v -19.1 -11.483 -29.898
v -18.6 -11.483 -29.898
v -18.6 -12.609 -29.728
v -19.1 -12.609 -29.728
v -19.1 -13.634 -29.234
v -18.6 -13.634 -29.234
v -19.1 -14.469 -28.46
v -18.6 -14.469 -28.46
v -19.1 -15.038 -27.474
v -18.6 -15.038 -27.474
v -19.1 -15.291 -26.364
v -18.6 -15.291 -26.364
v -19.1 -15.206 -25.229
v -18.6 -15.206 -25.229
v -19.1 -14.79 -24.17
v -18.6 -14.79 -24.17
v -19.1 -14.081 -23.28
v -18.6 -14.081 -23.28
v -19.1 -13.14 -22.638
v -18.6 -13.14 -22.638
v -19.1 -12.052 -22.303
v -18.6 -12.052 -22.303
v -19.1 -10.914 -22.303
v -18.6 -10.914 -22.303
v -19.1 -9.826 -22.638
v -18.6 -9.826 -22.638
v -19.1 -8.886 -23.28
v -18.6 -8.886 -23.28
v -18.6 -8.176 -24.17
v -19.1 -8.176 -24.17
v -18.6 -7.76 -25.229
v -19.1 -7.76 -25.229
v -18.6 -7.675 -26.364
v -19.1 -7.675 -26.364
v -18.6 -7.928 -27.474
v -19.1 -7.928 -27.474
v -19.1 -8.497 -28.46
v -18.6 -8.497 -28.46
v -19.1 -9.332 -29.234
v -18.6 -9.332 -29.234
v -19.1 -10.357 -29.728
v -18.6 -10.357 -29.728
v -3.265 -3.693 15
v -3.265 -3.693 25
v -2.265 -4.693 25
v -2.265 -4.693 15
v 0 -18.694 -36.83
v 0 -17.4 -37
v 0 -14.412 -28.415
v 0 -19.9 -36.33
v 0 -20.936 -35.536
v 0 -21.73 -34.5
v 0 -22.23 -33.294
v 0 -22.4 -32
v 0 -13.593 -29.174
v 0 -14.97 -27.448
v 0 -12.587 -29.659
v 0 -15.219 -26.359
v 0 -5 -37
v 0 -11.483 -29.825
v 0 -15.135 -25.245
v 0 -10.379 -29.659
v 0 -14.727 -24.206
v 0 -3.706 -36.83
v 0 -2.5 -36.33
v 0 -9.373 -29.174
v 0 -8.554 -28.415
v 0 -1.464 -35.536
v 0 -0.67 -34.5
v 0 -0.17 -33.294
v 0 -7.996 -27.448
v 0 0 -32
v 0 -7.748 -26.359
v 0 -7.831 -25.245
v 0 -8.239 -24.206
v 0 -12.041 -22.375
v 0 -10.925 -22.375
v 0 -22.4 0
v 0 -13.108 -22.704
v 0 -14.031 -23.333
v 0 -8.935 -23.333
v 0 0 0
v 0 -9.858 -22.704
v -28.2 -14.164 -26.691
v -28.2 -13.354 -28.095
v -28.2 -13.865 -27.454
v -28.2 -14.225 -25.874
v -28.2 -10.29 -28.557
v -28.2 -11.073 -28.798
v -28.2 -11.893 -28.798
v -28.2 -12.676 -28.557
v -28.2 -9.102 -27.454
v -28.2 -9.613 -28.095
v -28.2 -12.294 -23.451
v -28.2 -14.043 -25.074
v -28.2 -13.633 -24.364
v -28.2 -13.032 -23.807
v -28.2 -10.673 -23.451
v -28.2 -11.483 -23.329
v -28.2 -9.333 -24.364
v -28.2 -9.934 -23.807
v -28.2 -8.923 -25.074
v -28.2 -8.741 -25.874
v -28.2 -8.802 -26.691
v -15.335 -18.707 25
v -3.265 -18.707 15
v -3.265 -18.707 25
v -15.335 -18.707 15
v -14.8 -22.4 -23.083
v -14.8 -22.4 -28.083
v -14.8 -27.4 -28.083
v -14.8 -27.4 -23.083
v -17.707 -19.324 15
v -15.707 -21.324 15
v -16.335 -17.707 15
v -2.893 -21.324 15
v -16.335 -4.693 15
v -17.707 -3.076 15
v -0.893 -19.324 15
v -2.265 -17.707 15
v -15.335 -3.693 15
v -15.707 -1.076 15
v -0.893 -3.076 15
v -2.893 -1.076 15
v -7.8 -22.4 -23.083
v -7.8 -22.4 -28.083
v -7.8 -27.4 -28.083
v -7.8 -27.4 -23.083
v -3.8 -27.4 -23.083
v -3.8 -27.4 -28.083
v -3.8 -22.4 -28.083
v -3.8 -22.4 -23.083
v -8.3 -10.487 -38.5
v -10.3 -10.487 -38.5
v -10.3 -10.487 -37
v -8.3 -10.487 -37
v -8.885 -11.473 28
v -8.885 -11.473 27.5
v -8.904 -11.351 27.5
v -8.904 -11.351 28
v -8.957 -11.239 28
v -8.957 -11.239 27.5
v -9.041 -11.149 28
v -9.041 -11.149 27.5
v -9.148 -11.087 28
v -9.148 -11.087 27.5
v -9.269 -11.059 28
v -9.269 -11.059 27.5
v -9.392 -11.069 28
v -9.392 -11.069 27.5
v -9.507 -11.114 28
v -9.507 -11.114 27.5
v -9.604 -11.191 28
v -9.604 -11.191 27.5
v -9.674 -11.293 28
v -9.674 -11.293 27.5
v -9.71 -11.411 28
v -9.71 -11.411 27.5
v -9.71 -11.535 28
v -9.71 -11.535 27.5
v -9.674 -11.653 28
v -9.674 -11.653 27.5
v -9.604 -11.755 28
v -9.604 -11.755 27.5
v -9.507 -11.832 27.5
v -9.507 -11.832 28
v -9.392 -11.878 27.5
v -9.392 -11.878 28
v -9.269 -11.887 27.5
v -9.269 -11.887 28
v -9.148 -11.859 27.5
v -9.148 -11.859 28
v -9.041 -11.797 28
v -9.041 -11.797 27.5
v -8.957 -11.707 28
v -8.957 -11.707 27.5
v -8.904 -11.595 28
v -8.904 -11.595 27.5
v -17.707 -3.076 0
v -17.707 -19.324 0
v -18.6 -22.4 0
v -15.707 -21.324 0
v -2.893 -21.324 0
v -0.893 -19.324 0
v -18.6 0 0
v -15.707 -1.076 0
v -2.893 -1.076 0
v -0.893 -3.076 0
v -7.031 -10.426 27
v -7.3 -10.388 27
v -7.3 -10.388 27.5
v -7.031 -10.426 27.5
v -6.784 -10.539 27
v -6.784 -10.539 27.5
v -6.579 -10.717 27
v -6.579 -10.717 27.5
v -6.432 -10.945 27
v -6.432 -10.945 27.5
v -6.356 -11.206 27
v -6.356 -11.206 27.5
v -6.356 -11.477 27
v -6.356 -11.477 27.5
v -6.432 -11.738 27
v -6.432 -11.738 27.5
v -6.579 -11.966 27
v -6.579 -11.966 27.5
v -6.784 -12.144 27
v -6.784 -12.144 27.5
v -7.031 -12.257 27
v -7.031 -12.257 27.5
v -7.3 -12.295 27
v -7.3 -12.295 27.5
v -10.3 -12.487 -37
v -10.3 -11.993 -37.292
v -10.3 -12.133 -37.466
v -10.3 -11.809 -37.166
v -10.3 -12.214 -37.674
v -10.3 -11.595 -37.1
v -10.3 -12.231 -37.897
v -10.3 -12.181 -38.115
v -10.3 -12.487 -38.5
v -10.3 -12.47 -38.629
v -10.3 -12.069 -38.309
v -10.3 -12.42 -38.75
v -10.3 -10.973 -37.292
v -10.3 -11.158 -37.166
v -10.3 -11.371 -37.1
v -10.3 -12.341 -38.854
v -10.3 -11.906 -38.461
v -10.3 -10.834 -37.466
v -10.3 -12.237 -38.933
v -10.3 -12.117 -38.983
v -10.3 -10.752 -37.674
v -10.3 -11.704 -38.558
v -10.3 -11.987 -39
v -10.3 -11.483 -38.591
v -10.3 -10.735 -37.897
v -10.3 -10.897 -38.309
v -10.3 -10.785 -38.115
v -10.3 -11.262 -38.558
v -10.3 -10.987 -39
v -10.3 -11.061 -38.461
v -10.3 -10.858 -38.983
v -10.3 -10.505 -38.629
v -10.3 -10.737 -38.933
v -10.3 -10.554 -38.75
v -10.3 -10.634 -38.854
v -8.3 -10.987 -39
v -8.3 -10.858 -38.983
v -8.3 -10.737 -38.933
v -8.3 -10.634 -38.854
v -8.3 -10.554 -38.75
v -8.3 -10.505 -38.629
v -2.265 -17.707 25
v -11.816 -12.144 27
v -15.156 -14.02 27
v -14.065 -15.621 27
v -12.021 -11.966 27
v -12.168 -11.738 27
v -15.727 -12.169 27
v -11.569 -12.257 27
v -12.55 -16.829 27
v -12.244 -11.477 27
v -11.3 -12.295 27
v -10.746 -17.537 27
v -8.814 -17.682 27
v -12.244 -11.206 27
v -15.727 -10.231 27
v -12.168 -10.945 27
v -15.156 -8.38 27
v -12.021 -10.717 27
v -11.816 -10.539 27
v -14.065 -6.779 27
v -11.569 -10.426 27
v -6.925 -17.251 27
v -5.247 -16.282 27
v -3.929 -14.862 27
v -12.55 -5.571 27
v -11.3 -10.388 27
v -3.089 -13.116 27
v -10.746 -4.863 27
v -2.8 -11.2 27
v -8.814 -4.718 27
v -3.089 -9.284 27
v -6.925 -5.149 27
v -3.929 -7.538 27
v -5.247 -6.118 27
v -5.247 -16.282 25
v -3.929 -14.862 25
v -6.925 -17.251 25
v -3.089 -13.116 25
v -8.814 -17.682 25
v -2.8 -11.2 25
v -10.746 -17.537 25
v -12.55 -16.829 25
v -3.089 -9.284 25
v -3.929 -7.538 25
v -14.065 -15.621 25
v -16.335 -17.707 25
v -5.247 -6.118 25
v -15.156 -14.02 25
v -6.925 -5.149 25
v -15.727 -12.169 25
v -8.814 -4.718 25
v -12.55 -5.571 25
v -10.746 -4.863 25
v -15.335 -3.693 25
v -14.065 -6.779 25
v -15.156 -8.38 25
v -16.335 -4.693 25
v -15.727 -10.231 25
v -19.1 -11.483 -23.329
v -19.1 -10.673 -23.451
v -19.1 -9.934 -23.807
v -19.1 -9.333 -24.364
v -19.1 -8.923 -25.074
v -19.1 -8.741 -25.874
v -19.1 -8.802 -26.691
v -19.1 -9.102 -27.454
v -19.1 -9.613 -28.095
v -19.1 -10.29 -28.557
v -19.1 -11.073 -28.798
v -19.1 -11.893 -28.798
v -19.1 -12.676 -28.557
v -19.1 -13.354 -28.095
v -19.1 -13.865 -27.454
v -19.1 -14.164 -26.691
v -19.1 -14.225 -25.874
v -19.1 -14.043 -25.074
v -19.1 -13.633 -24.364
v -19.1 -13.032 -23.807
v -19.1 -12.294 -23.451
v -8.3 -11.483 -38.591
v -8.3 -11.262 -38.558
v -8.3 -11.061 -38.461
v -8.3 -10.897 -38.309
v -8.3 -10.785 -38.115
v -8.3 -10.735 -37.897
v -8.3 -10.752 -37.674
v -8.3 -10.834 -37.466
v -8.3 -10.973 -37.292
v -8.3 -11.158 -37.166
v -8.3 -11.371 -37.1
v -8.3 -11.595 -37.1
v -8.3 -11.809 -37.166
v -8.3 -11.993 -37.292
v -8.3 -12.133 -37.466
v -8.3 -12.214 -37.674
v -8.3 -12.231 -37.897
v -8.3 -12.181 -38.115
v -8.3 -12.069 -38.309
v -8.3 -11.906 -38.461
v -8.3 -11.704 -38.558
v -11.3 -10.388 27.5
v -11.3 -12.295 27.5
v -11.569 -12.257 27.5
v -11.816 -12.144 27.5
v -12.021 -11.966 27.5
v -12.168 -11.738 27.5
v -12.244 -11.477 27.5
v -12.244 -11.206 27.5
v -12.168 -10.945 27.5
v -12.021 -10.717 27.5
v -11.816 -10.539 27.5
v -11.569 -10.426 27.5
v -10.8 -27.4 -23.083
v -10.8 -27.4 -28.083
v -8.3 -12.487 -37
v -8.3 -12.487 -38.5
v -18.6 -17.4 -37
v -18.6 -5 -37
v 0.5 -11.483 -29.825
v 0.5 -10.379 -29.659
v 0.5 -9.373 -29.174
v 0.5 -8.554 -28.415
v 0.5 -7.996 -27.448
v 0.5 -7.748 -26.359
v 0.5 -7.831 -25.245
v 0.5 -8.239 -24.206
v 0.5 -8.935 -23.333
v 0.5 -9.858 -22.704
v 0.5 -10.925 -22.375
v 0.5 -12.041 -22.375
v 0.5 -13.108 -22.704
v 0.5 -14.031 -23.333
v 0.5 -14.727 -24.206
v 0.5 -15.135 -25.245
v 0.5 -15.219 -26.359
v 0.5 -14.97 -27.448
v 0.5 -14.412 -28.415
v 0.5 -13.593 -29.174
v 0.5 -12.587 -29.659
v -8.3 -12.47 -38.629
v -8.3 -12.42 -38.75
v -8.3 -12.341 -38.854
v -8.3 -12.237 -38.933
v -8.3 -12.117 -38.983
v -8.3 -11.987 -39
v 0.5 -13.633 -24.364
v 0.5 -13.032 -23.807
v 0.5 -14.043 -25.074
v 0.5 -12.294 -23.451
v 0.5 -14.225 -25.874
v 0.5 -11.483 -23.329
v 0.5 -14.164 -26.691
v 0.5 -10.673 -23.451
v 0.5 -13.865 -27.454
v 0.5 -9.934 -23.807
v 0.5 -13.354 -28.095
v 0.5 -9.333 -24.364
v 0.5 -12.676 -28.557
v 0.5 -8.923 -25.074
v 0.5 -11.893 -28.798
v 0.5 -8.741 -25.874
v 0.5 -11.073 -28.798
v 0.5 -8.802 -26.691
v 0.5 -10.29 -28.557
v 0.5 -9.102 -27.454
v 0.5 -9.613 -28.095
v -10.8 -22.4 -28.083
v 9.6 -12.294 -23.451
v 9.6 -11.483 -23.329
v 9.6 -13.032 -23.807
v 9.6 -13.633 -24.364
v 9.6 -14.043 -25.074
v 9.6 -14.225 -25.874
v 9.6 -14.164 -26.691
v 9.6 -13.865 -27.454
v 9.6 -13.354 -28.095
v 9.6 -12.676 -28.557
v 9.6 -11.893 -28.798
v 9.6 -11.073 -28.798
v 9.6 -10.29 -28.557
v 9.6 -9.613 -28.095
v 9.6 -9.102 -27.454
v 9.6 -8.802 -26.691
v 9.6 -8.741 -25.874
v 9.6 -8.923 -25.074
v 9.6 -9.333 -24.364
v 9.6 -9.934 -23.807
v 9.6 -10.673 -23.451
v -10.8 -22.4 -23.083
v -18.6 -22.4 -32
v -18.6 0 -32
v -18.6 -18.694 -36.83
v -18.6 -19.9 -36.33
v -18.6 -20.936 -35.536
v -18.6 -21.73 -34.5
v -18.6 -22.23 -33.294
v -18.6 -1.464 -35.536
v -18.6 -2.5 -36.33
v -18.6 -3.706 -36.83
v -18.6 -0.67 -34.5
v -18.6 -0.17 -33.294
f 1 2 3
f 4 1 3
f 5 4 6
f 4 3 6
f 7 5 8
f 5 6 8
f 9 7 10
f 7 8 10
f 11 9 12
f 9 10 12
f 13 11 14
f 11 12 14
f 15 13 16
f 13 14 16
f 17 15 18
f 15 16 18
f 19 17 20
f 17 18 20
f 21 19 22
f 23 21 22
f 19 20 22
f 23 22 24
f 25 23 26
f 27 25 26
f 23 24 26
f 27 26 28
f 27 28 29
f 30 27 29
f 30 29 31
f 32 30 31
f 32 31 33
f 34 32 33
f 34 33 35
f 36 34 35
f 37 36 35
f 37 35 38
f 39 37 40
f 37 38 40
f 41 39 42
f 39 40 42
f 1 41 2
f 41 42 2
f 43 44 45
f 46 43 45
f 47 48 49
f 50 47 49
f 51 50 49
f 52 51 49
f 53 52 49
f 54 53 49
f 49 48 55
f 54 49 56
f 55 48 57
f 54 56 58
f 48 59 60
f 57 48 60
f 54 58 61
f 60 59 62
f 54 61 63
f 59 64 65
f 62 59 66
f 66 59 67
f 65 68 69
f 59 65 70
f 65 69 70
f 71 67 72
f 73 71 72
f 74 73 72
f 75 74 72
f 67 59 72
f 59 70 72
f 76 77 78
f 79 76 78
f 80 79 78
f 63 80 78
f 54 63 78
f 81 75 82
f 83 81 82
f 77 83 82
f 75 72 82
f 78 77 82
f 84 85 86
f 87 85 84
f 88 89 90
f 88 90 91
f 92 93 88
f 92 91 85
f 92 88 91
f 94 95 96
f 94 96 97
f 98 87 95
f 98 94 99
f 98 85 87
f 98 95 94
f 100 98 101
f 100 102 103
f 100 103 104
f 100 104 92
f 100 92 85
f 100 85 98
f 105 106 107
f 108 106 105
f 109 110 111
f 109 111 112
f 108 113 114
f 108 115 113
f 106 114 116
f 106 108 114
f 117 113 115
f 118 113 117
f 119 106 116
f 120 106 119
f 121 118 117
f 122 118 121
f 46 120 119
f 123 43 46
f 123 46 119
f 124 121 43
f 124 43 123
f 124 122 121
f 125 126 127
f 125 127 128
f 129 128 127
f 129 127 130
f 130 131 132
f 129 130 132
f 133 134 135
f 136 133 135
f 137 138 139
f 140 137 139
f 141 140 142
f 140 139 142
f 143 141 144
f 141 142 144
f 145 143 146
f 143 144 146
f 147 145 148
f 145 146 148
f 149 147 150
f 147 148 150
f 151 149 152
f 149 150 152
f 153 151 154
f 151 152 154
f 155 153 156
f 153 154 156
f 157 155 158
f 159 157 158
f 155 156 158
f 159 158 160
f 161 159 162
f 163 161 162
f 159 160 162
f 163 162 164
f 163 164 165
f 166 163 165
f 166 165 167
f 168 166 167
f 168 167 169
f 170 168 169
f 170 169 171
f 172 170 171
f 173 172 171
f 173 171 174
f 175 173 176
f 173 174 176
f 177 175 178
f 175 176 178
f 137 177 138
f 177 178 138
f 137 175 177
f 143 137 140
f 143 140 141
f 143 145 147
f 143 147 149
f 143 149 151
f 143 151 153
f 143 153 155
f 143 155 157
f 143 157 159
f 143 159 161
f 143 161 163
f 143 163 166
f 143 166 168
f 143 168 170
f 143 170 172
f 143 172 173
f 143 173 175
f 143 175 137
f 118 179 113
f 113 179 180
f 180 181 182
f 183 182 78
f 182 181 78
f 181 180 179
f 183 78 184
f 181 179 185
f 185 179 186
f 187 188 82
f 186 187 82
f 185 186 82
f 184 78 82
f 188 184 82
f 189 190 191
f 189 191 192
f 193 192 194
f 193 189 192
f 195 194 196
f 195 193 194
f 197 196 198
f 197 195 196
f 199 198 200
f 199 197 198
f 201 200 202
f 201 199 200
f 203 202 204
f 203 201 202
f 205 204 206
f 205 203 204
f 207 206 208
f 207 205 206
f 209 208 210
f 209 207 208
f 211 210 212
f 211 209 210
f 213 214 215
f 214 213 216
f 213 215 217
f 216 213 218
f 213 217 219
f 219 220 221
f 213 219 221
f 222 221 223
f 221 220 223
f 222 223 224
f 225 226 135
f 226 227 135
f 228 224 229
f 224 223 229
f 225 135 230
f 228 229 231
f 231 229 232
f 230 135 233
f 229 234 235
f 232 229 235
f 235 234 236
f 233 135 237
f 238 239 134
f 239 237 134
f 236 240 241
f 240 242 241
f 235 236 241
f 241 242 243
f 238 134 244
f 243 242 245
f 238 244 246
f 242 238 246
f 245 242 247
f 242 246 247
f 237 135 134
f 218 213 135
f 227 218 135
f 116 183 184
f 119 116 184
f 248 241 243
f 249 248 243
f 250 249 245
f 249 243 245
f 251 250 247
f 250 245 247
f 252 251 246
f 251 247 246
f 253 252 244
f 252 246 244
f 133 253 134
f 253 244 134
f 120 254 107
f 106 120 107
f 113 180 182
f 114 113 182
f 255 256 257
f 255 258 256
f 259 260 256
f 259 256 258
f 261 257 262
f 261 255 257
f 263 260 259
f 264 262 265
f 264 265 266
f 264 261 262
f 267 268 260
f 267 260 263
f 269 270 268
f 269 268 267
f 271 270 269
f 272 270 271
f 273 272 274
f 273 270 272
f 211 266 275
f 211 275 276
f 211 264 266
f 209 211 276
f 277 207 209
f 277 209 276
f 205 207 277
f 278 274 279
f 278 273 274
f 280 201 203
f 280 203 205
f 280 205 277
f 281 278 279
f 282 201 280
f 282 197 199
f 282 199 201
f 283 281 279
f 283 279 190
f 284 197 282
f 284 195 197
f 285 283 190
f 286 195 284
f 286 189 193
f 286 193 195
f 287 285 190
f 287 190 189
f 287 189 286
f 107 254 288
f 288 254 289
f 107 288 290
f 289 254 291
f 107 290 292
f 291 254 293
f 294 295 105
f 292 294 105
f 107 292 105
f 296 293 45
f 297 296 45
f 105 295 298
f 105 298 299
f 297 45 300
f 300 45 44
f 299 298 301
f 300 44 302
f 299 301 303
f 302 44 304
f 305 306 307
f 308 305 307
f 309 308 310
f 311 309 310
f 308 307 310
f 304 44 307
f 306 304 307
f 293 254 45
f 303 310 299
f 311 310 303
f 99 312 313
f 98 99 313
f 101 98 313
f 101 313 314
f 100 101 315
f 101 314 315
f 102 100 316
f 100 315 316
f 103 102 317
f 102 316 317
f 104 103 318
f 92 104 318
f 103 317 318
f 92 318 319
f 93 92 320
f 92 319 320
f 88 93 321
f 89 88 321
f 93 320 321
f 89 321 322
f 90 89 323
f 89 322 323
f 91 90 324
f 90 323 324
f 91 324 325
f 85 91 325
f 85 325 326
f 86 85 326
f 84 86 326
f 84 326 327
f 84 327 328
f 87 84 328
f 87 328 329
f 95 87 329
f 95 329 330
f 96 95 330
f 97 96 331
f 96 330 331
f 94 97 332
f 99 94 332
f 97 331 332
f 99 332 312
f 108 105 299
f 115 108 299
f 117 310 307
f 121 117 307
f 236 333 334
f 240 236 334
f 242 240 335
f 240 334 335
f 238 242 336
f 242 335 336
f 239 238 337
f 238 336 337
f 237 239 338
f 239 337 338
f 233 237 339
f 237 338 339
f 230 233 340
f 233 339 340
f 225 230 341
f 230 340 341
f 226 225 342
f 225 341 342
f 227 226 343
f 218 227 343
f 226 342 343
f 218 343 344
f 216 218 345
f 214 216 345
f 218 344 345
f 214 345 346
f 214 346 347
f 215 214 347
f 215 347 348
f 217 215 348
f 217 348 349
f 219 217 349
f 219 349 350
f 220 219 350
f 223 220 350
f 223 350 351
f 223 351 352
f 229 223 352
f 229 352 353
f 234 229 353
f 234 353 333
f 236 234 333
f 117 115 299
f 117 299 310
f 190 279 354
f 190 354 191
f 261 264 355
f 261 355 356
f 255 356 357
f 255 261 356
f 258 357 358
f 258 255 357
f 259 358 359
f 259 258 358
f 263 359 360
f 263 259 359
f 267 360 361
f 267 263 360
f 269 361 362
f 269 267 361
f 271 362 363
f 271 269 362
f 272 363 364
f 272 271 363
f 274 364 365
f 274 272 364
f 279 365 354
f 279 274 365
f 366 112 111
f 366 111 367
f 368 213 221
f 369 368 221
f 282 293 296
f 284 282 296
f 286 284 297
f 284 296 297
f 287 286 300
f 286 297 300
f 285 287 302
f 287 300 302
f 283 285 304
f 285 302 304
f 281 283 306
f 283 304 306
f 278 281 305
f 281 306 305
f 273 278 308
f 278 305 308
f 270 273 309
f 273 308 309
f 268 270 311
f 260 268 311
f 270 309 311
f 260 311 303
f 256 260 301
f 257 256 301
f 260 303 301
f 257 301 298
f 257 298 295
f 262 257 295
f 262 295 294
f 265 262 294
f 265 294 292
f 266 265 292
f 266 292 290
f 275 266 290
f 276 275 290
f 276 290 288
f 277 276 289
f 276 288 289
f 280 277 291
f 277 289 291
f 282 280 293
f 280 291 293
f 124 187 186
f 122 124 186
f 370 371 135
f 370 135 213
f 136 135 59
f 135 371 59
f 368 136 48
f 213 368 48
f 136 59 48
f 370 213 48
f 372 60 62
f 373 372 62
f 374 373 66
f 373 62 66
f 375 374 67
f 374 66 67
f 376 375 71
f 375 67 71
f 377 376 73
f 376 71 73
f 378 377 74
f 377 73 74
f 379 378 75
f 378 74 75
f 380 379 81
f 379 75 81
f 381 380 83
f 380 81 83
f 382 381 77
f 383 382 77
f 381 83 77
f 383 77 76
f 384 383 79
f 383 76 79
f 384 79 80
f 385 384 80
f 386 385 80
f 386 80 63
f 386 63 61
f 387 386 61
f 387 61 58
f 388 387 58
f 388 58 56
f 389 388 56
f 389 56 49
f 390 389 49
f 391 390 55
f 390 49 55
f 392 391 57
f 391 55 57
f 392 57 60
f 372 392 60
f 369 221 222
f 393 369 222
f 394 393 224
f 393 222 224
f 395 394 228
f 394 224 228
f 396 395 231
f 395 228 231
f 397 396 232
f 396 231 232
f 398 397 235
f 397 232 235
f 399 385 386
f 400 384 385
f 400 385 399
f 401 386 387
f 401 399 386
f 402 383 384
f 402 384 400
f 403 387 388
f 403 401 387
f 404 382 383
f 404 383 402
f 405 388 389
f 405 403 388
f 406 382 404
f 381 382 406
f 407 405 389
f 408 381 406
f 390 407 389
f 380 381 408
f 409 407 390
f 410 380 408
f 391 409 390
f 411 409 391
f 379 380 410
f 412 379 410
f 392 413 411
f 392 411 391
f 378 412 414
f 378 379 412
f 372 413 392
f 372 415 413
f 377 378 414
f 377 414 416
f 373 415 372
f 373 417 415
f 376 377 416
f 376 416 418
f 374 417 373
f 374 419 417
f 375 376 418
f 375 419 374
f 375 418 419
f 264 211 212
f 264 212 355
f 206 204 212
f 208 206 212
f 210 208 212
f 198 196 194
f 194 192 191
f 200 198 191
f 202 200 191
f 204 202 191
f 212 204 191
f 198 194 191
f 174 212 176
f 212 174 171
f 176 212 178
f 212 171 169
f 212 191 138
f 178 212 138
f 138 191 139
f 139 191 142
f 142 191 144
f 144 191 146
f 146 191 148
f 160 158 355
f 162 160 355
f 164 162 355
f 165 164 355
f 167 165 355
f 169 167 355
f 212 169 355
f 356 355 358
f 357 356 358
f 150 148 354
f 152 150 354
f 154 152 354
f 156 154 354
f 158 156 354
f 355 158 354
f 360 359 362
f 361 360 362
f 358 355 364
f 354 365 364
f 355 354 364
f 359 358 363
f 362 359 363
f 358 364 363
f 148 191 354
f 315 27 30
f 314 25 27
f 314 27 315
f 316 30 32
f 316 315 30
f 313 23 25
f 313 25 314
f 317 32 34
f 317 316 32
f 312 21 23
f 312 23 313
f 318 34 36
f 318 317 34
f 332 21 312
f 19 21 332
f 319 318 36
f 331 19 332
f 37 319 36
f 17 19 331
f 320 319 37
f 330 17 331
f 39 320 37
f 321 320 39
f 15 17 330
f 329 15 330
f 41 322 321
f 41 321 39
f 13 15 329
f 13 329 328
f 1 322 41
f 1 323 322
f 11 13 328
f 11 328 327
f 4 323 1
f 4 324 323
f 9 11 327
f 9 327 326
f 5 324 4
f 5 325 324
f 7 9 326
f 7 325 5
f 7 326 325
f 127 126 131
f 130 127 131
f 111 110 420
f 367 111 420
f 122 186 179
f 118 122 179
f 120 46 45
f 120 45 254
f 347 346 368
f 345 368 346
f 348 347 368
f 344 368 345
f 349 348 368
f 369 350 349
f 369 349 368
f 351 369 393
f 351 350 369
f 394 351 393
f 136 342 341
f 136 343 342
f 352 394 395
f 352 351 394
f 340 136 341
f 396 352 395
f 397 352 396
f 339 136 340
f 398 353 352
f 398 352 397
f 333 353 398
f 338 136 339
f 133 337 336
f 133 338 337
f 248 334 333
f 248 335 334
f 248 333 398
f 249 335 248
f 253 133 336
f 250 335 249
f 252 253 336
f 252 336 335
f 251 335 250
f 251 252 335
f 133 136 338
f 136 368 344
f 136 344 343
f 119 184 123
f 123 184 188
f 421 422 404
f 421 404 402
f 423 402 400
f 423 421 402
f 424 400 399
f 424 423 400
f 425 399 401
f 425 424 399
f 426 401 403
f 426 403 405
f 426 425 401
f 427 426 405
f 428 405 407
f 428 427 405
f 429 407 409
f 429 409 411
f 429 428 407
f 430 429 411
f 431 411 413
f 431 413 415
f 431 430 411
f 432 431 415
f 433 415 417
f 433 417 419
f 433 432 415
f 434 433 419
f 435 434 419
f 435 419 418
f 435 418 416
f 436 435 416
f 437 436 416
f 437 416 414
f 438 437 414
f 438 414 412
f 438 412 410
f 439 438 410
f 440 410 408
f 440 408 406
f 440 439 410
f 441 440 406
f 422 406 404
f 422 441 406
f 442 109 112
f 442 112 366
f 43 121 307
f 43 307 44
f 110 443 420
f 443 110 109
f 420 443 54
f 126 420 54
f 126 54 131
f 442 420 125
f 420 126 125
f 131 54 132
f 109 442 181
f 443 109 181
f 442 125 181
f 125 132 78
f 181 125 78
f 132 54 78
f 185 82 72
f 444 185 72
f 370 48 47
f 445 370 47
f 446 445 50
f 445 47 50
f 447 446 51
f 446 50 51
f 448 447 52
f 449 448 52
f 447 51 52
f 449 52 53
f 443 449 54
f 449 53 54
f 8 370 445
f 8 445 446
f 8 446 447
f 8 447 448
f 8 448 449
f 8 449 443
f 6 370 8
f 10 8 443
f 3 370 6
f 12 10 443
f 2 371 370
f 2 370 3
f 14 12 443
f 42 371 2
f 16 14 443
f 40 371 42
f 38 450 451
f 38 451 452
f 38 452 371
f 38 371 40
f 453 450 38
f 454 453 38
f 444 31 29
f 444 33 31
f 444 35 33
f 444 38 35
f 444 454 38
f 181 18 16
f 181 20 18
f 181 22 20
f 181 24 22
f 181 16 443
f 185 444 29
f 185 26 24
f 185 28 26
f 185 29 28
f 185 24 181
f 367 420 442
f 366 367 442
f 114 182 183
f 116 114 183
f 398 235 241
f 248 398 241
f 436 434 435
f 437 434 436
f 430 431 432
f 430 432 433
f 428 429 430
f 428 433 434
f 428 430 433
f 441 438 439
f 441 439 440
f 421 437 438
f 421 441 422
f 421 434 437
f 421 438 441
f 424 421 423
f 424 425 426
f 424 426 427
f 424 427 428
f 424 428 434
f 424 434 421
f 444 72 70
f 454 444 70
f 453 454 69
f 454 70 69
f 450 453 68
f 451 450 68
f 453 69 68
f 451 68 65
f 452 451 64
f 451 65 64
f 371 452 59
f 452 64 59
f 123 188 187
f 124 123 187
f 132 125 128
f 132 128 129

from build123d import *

# Parameters (mm, degrees)
BOSS_EXTRUDE2_DEPTH      = 18.6
BOSS_EXTRUDE3_DEPTH      = 1
BOSS_EXTRUDE3_DEPTH_BACK = 1
SKETCH4_R                = 0.75
CUT_EXTRUDE1_DEPTH       = 47.139462502
BOSS_EXTRUDE5_DEPTH      = 15
BOSS_EXTRUDE6_DEPTH      = 10
SKETCH7_R                = 6.5
BOSS_EXTRUDE7_DEPTH      = 2
BOSS_EXTRUDE8_DEPTH      = 0.5
SKETCH9_R                = 0.414833025
BOSS_EXTRUDE9_DEPTH      = 0.5
SKETCH11_R               = 3.745995244
BOSS_EXTRUDE10_DEPTH     = 0.5
SKETCH13_R               = 3.818916781
BOSS_EXTRUDE11_DEPTH     = 0.5
SKETCH14_R               = 2.75
BOSS_EXTRUDE12_DEPTH     = 9.1
BOSS_EXTRUDE13_START     = 9.1
SKETCH12_R               = 2.75
BOSS_EXTRUDE13_DEPTH     = 9.1
SKETCH15_W               = 4
SKETCH15_H               = 5
BOSS_EXTRUDE14_DEPTH     = 5


with BuildPart() as part:
    # Sketch2 → Boss-Extrude2 (new body)
    with BuildSketch(Plane(origin=(0, 0, 0), x_dir=(0, 0, -1), z_dir=(1, 0, 0))):
        with BuildLine():
            Line((0, 0), (32, 0))
            ThreePointArc((32, 0), (35.535533906, -1.464466094), (37, -5))
            Line((37, -5), (37, -17.4))
            ThreePointArc((37, -17.4), (35.535533906, -20.935533906), (32, -22.4))
            Line((32, -22.4), (0, -22.4))
            Line((0, -22.4), (0, 0))
        make_face()
    extrude(amount=-BOSS_EXTRUDE2_DEPTH)

    # Sketch3 → Boss-Extrude3 (add, two sides: drawn at the far end of the back side and taken through both)
    with BuildSketch(Plane(origin=(-9.3, 0, 0), x_dir=(0, 0, -1), z_dir=(1, 0, 0)).offset(-BOSS_EXTRUDE3_DEPTH_BACK)):
        with BuildLine():
            Line((39, -11.987468366), (39, -10.987468366))
            ThreePointArc((39, -10.987468366), (38.853553391, -10.633914975), (38.5, -10.487468366))
            Line((38.5, -10.487468366), (37, -10.487468366))
            Line((37, -10.487468366), (37, -12.487468366))
            Line((37, -12.487468366), (38.5, -12.487468366))
            ThreePointArc((38.5, -12.487468366), (38.853553391, -12.341021757), (39, -11.987468366))
        make_face()
    extrude(amount=BOSS_EXTRUDE3_DEPTH + BOSS_EXTRUDE3_DEPTH_BACK)

    # Sketch4 → Cut-Extrude1 (cut, through all)
    with BuildSketch(Plane(origin=(-8.3, 0, 0), x_dir=(0, 0, -1), z_dir=(1, 0, 0))):
        with Locations((37.841364182, -11.483102308)):
            Circle(SKETCH4_R)
    extrude(amount=-CUT_EXTRUDE1_DEPTH, mode=Mode.SUBTRACT)

    # Sketch5 → Boss-Extrude5 (add)
    with BuildSketch(Plane.XY):
        Polygon((-15.706913813, -21.324455345), (-2.893086187, -21.324455345), (-0.893086187, -19.324455345), (-0.893086187, -3.075544655), (-2.893086187, -1.075544655), (-15.706913813, -1.075544655), (-17.706913813, -3.075544655), (-17.706913813, -19.324455345), align=None)
    extrude(amount=BOSS_EXTRUDE5_DEPTH)

    # Sketch6 → Boss-Extrude6 (add)
    with BuildSketch(Plane.XY.offset(15)):
        Polygon((-15.335098918, -3.69274237), (-3.264901082, -3.69274237), (-2.264901082, -4.69274237), (-2.264901082, -17.70725763), (-3.264901082, -18.70725763), (-15.335098918, -18.70725763), (-16.335098918, -17.70725763), (-16.335098918, -4.69274237), align=None)
    extrude(amount=BOSS_EXTRUDE6_DEPTH)

    # Sketch7 → Boss-Extrude7 (add)
    with BuildSketch(Plane.XY.offset(25)):
        with Locations((-9.3, -11.2)):
            Circle(SKETCH7_R)
    extrude(amount=BOSS_EXTRUDE7_DEPTH)

    # Sketch8 → Boss-Extrude8 (add)
    with BuildSketch(Plane.XY.offset(27)):
        with BuildLine():
            Line((-11.3, -10.387788461), (-7.3, -10.387788461))
            ThreePointArc((-7.3, -10.387788461), (-6.346187608, -11.341600853), (-7.3, -12.295413245))
            Line((-7.3, -12.295413245), (-11.3, -12.295413245))
            ThreePointArc((-11.3, -12.295413245), (-12.253812392, -11.341600853), (-11.3, -10.387788461))
        make_face()
    extrude(amount=BOSS_EXTRUDE8_DEPTH)

    # Sketch9 → Boss-Extrude9 (add)
    with BuildSketch(Plane.XY.offset(27.5)):
        with Locations((-9.3, -11.473161183)):
            Circle(SKETCH9_R)
    extrude(amount=BOSS_EXTRUDE9_DEPTH)

    # Sketch11 → Boss-Extrude10 (add)
    with BuildSketch(Plane(origin=(0, 0, 0), x_dir=(0, 0, -1), z_dir=(1, 0, 0))):
        with Locations((26.079029107, -11.483102308)):
            Circle(SKETCH11_R)
    extrude(amount=BOSS_EXTRUDE10_DEPTH)

    # Sketch13 → Boss-Extrude11 (add)
    with BuildSketch(Plane.ZY.offset(18.6)):
        with Locations(Location((-26.079029107, -11.483102308, 0), (0, 0, 180))):
            Circle(SKETCH13_R)
    extrude(amount=BOSS_EXTRUDE11_DEPTH)

    # Sketch14 → Boss-Extrude12 (add)
    with BuildSketch(Plane.ZY.offset(19.1)):
        with Locations((-26.079029107, -11.483102308)):
            Circle(SKETCH14_R)
    extrude(amount=BOSS_EXTRUDE12_DEPTH)

    # Sketch12 → Boss-Extrude13 (add)
    with BuildSketch(Plane(origin=(0.5, 0, 0), x_dir=(0, 0, -1), z_dir=(1, 0, 0)).offset(BOSS_EXTRUDE13_START)):
        with Locations(Location((26.079029107, -11.483102308, 0), (0, 0, 180))):
            Circle(SKETCH12_R)
    extrude(amount=-BOSS_EXTRUDE13_DEPTH)

    # Sketch15 → Boss-Extrude14 (add)
    with BuildSketch(Plane.XZ.offset(22.4)):
        with Locations((-5.8, -25.582825972)):
            Rectangle(SKETCH15_W, SKETCH15_H)
        with Locations((-12.8, -25.582825972)):
            Rectangle(SKETCH15_W, SKETCH15_H)
    extrude(amount=BOSS_EXTRUDE14_DEPTH)


solid = part.part
